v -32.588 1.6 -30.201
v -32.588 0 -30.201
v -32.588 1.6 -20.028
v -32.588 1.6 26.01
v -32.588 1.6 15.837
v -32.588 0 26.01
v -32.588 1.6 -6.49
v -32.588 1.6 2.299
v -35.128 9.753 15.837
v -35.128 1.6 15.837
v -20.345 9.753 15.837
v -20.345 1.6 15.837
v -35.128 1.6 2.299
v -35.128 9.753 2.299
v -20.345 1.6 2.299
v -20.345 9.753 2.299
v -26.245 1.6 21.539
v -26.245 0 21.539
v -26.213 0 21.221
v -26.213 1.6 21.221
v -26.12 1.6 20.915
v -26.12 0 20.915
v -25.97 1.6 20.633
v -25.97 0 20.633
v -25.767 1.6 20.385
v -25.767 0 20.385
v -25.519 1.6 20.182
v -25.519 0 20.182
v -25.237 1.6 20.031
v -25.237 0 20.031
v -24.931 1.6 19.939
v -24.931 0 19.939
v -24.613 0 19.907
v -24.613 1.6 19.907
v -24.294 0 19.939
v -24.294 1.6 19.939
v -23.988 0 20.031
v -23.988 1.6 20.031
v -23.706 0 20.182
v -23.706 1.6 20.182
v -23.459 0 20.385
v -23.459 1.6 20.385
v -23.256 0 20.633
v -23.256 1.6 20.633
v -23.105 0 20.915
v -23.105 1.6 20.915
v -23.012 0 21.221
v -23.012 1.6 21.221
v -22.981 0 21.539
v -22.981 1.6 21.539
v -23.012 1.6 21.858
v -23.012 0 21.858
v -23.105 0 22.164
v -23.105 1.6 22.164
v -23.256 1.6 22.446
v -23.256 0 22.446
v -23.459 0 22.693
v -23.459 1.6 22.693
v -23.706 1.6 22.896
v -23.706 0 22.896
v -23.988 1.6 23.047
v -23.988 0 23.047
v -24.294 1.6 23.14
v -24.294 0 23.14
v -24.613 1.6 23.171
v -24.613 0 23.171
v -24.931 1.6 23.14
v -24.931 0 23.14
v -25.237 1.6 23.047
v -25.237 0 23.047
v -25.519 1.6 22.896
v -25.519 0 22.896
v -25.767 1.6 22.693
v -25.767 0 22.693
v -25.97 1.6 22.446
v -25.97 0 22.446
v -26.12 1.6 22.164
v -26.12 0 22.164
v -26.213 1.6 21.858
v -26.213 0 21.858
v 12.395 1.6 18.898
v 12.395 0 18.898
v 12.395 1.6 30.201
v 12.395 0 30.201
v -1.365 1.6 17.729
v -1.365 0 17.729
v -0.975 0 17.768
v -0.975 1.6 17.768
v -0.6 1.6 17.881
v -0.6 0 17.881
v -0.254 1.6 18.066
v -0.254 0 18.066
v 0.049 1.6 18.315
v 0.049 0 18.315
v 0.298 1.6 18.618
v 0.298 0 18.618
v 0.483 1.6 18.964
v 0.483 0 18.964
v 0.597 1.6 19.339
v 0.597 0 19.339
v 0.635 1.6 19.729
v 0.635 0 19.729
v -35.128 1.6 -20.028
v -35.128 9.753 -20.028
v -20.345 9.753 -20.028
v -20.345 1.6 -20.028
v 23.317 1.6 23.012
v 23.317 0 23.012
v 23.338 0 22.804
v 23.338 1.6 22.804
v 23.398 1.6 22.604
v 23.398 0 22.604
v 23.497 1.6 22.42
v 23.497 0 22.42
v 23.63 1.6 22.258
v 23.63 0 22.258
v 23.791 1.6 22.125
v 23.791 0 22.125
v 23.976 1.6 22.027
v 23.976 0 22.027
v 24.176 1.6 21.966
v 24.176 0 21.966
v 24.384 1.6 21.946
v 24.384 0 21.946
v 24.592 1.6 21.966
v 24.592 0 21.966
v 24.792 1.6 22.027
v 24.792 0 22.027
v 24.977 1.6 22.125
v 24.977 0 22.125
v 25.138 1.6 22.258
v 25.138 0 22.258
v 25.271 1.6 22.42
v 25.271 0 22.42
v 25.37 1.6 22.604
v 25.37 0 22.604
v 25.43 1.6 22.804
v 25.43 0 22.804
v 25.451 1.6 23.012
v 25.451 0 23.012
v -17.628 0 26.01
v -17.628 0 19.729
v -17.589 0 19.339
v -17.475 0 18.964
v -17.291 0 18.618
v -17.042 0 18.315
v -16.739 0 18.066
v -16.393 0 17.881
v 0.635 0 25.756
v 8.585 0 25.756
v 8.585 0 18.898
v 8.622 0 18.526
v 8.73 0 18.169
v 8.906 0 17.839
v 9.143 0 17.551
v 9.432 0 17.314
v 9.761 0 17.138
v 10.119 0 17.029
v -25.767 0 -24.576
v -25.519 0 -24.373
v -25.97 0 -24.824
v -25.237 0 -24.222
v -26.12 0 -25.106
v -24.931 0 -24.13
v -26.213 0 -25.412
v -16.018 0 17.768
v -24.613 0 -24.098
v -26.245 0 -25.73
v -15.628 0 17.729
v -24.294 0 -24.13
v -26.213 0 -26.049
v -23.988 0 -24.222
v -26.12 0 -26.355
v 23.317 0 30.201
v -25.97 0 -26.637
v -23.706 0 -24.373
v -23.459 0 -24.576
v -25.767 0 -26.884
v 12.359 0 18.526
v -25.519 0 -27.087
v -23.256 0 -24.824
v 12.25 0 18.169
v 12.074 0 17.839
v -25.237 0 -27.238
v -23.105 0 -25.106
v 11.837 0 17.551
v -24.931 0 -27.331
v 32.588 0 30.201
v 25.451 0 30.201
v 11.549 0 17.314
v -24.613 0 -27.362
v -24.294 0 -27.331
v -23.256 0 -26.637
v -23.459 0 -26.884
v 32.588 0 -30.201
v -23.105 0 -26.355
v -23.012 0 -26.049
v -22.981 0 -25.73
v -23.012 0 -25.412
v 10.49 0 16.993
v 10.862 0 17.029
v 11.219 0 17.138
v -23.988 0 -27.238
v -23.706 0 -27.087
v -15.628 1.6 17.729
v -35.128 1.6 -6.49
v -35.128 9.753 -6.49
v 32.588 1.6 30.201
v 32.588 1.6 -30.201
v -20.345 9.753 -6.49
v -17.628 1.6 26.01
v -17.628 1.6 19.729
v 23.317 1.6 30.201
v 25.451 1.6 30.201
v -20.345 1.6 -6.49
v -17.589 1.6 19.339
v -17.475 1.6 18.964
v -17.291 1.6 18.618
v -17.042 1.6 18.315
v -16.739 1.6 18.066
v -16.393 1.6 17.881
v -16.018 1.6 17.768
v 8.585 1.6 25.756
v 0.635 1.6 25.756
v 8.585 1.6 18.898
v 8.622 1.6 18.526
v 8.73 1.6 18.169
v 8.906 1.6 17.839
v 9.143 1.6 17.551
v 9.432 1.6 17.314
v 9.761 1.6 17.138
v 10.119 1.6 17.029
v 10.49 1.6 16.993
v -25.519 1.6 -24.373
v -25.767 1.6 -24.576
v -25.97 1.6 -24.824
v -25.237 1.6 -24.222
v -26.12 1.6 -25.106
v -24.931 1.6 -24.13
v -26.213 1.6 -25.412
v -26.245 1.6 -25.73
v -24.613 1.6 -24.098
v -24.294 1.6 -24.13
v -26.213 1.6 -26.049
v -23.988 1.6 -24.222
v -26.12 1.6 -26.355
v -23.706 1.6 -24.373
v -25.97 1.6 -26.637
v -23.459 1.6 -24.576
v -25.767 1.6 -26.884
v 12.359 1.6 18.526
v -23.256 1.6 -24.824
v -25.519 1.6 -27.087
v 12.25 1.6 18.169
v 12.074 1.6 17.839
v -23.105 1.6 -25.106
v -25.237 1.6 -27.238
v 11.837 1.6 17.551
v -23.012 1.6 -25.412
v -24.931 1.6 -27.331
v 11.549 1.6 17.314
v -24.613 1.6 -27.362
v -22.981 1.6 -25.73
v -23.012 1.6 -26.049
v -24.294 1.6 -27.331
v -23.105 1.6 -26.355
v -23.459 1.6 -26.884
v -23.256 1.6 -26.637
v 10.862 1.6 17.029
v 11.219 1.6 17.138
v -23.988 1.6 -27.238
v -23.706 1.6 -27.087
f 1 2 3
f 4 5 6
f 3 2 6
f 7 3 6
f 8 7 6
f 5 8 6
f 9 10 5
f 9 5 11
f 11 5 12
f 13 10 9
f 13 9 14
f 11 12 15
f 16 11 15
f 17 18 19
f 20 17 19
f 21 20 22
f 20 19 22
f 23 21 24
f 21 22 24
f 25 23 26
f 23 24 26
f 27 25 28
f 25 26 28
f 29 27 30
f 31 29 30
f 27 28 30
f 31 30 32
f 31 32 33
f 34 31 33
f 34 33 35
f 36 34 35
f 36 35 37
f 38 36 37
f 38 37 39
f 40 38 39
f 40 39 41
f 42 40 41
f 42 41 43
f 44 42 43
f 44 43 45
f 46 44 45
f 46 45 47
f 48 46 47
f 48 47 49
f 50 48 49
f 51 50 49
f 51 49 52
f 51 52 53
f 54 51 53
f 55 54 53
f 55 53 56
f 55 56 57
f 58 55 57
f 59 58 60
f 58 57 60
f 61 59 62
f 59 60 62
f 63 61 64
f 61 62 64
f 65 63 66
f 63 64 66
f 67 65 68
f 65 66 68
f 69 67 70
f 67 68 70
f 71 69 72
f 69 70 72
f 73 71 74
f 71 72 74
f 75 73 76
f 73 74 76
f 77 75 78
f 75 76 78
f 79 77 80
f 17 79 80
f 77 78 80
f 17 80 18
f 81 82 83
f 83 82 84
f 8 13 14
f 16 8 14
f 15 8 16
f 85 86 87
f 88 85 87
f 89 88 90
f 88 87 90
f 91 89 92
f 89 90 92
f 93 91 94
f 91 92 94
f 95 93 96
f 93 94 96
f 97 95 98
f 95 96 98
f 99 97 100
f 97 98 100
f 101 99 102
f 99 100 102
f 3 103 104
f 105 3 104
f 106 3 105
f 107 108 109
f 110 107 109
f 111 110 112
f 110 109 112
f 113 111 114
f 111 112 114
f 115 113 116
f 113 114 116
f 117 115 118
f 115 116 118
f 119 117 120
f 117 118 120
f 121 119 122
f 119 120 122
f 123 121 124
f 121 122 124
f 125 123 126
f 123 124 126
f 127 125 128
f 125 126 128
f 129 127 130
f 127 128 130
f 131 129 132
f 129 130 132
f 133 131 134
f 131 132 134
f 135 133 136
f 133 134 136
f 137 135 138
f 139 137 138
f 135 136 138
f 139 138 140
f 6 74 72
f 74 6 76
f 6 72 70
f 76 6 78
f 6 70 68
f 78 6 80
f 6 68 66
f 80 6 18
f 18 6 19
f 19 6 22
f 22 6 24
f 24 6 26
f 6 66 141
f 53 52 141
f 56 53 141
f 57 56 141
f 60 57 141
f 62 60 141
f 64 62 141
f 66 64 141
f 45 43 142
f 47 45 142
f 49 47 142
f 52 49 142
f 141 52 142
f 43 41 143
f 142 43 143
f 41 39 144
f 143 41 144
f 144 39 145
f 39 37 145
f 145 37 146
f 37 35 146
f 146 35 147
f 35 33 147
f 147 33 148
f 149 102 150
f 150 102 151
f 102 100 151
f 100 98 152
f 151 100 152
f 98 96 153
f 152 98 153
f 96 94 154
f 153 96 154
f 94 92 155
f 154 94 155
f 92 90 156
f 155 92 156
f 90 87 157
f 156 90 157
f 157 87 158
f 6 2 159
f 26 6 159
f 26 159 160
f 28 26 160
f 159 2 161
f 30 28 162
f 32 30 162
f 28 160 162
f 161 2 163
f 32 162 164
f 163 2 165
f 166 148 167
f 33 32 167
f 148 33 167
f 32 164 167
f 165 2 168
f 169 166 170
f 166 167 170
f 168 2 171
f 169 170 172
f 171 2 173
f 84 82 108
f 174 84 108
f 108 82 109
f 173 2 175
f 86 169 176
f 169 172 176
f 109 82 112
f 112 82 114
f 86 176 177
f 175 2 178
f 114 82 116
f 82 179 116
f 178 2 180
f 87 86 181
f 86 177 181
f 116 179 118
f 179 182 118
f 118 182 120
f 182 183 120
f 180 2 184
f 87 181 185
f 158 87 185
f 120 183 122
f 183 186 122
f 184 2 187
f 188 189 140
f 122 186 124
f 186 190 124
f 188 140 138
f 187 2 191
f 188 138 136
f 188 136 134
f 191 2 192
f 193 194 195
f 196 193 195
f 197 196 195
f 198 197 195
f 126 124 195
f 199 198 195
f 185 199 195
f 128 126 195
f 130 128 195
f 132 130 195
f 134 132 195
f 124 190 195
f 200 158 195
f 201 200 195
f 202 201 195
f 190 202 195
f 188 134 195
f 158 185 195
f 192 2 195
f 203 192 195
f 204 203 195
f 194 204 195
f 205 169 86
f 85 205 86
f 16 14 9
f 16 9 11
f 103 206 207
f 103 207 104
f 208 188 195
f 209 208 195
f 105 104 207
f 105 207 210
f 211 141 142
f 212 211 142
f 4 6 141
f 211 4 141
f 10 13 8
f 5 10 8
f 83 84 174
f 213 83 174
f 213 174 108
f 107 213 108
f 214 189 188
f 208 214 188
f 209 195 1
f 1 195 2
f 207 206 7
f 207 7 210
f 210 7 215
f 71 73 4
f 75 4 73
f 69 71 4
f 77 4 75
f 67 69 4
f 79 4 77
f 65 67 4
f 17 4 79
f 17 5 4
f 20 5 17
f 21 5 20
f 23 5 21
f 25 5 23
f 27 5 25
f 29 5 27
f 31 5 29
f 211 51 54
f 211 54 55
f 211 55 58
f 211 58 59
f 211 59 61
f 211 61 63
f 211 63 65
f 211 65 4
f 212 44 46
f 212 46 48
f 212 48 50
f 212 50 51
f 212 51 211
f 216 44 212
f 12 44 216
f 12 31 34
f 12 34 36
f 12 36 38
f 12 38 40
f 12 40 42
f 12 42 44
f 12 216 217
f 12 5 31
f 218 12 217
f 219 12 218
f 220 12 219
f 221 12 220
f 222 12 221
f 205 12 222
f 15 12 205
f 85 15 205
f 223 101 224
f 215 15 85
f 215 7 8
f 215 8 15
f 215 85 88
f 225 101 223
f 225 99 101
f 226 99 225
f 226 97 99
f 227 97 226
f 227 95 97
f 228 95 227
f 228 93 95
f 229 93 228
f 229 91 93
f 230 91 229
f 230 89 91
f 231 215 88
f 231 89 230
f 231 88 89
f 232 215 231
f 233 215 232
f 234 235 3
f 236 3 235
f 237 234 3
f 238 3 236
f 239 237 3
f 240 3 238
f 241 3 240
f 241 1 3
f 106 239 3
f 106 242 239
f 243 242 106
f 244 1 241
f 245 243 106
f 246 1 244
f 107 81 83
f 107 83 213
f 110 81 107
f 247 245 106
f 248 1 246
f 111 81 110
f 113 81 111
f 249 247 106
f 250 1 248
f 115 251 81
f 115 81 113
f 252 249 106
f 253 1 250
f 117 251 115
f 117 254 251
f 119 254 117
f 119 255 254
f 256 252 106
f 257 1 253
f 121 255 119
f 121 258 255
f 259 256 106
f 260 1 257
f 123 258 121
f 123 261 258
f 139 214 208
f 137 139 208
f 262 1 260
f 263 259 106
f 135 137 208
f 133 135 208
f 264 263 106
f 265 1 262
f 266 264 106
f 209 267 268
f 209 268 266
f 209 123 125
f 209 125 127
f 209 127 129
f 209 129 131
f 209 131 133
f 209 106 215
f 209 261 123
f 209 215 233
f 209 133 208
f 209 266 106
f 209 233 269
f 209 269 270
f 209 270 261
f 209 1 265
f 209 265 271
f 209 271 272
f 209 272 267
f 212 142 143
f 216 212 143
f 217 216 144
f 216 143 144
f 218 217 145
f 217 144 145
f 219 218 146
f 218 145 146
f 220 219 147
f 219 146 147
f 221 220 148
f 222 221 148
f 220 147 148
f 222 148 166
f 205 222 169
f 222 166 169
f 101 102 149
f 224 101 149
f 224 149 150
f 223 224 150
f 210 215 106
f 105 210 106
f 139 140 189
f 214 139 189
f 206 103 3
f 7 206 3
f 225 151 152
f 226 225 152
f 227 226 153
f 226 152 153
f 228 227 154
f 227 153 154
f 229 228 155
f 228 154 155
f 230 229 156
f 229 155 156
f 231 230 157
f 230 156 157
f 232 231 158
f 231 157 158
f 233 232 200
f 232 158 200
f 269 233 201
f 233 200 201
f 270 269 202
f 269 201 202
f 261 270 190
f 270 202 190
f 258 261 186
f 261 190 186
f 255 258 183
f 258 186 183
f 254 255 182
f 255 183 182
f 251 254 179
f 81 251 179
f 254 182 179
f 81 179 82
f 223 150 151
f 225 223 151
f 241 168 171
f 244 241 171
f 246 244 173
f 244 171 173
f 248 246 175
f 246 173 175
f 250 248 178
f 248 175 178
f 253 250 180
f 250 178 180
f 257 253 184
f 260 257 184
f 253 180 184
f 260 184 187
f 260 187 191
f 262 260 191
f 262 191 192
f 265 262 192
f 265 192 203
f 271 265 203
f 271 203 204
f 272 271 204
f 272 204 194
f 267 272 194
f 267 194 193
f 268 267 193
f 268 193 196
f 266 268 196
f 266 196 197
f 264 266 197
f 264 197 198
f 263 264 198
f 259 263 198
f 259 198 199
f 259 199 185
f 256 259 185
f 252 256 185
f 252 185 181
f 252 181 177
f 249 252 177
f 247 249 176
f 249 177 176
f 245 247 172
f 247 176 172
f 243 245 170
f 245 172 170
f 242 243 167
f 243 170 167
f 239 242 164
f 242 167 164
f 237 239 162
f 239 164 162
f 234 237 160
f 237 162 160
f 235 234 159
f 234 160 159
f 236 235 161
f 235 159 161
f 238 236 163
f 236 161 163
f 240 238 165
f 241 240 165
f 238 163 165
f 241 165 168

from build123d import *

# Parameters (mm, degrees)
BOSS_EXTRUDE1_DEPTH   = 1.6
F_4_CLEARANCE_HOLE1_D = 3.2639
SKETCH4_W             = 14.7828
SKETCH4_H             = 13.5382
BOSS_EXTRUDE2_DEPTH   = 8.1534


with BuildPart() as part:
    # Sketch1 → Boss-Extrude1 (new body)
    with BuildSketch(Plane(origin=(0, 0, 0), x_dir=(1, 0, 0), z_dir=(0, 1, 0))):
        with BuildLine():
            Line((23.3172, -30.2006), (23.3172, -23.0124))
            ThreePointArc((23.3172, -23.0124), (24.384, -21.9456), (25.4508, -23.0124))
            Line((25.4508, -23.0124), (25.4508, -30.2006))
            Line((25.4508, -30.2006), (32.5882, -30.2006))
            Line((32.5882, -30.2006), (32.5882, 30.2006))
            Line((32.5882, 30.2006), (-32.5882, 30.2006))
            Line((-32.5882, 30.2006), (-32.5882, -26.0096))
            Line((-32.5882, -26.0096), (-17.6276, -26.0096))
            Line((-17.6276, -26.0096), (-17.6276, -19.7292))
            ThreePointArc((-17.6276, -19.7292), (-17.041813562, -18.314986438), (-15.6276, -17.7292))
            Line((-15.6276, -17.7292), (-1.365, -17.7292))
            ThreePointArc((-1.365, -17.7292), (0.049213562, -18.314986438), (0.635, -19.7292))
            Line((0.635, -19.7292), (0.635, -25.7556))
            Line((0.635, -25.7556), (8.5852, -25.7556))
            Line((8.5852, -25.7556), (8.5852, -18.8976))
            ThreePointArc((8.5852, -18.8976), (10.4902, -16.9926), (12.3952, -18.8976))
            Line((12.3952, -18.8976), (12.3952, -30.2006))
            Line((12.3952, -30.2006), (23.3172, -30.2006))
        make_face()
    extrude(amount=BOSS_EXTRUDE1_DEPTH)

    # #4 Clearance Hole1 (through all)
    with Locations(Plane(origin=(0, 1.6, 0), x_dir=(1, 0, 0), z_dir=(0, 1, 0))):
        with Locations((-24.6126, 25.7302), (-24.6126, -21.5392)):
            Hole(F_4_CLEARANCE_HOLE1_D / 2)

    # Sketch4 → Boss-Extrude2 (add)
    with BuildSketch(Plane(origin=(0, 1.6, 0), x_dir=(1, 0, 0), z_dir=(0, 1, 0))):
        with Locations((-27.7368, 13.2588)):
            Rectangle(SKETCH4_W, SKETCH4_H)
        with Locations((-27.7368, -9.0678)):
            Rectangle(SKETCH4_W, SKETCH4_H)
    extrude(amount=BOSS_EXTRUDE2_DEPTH)


solid = part.part
